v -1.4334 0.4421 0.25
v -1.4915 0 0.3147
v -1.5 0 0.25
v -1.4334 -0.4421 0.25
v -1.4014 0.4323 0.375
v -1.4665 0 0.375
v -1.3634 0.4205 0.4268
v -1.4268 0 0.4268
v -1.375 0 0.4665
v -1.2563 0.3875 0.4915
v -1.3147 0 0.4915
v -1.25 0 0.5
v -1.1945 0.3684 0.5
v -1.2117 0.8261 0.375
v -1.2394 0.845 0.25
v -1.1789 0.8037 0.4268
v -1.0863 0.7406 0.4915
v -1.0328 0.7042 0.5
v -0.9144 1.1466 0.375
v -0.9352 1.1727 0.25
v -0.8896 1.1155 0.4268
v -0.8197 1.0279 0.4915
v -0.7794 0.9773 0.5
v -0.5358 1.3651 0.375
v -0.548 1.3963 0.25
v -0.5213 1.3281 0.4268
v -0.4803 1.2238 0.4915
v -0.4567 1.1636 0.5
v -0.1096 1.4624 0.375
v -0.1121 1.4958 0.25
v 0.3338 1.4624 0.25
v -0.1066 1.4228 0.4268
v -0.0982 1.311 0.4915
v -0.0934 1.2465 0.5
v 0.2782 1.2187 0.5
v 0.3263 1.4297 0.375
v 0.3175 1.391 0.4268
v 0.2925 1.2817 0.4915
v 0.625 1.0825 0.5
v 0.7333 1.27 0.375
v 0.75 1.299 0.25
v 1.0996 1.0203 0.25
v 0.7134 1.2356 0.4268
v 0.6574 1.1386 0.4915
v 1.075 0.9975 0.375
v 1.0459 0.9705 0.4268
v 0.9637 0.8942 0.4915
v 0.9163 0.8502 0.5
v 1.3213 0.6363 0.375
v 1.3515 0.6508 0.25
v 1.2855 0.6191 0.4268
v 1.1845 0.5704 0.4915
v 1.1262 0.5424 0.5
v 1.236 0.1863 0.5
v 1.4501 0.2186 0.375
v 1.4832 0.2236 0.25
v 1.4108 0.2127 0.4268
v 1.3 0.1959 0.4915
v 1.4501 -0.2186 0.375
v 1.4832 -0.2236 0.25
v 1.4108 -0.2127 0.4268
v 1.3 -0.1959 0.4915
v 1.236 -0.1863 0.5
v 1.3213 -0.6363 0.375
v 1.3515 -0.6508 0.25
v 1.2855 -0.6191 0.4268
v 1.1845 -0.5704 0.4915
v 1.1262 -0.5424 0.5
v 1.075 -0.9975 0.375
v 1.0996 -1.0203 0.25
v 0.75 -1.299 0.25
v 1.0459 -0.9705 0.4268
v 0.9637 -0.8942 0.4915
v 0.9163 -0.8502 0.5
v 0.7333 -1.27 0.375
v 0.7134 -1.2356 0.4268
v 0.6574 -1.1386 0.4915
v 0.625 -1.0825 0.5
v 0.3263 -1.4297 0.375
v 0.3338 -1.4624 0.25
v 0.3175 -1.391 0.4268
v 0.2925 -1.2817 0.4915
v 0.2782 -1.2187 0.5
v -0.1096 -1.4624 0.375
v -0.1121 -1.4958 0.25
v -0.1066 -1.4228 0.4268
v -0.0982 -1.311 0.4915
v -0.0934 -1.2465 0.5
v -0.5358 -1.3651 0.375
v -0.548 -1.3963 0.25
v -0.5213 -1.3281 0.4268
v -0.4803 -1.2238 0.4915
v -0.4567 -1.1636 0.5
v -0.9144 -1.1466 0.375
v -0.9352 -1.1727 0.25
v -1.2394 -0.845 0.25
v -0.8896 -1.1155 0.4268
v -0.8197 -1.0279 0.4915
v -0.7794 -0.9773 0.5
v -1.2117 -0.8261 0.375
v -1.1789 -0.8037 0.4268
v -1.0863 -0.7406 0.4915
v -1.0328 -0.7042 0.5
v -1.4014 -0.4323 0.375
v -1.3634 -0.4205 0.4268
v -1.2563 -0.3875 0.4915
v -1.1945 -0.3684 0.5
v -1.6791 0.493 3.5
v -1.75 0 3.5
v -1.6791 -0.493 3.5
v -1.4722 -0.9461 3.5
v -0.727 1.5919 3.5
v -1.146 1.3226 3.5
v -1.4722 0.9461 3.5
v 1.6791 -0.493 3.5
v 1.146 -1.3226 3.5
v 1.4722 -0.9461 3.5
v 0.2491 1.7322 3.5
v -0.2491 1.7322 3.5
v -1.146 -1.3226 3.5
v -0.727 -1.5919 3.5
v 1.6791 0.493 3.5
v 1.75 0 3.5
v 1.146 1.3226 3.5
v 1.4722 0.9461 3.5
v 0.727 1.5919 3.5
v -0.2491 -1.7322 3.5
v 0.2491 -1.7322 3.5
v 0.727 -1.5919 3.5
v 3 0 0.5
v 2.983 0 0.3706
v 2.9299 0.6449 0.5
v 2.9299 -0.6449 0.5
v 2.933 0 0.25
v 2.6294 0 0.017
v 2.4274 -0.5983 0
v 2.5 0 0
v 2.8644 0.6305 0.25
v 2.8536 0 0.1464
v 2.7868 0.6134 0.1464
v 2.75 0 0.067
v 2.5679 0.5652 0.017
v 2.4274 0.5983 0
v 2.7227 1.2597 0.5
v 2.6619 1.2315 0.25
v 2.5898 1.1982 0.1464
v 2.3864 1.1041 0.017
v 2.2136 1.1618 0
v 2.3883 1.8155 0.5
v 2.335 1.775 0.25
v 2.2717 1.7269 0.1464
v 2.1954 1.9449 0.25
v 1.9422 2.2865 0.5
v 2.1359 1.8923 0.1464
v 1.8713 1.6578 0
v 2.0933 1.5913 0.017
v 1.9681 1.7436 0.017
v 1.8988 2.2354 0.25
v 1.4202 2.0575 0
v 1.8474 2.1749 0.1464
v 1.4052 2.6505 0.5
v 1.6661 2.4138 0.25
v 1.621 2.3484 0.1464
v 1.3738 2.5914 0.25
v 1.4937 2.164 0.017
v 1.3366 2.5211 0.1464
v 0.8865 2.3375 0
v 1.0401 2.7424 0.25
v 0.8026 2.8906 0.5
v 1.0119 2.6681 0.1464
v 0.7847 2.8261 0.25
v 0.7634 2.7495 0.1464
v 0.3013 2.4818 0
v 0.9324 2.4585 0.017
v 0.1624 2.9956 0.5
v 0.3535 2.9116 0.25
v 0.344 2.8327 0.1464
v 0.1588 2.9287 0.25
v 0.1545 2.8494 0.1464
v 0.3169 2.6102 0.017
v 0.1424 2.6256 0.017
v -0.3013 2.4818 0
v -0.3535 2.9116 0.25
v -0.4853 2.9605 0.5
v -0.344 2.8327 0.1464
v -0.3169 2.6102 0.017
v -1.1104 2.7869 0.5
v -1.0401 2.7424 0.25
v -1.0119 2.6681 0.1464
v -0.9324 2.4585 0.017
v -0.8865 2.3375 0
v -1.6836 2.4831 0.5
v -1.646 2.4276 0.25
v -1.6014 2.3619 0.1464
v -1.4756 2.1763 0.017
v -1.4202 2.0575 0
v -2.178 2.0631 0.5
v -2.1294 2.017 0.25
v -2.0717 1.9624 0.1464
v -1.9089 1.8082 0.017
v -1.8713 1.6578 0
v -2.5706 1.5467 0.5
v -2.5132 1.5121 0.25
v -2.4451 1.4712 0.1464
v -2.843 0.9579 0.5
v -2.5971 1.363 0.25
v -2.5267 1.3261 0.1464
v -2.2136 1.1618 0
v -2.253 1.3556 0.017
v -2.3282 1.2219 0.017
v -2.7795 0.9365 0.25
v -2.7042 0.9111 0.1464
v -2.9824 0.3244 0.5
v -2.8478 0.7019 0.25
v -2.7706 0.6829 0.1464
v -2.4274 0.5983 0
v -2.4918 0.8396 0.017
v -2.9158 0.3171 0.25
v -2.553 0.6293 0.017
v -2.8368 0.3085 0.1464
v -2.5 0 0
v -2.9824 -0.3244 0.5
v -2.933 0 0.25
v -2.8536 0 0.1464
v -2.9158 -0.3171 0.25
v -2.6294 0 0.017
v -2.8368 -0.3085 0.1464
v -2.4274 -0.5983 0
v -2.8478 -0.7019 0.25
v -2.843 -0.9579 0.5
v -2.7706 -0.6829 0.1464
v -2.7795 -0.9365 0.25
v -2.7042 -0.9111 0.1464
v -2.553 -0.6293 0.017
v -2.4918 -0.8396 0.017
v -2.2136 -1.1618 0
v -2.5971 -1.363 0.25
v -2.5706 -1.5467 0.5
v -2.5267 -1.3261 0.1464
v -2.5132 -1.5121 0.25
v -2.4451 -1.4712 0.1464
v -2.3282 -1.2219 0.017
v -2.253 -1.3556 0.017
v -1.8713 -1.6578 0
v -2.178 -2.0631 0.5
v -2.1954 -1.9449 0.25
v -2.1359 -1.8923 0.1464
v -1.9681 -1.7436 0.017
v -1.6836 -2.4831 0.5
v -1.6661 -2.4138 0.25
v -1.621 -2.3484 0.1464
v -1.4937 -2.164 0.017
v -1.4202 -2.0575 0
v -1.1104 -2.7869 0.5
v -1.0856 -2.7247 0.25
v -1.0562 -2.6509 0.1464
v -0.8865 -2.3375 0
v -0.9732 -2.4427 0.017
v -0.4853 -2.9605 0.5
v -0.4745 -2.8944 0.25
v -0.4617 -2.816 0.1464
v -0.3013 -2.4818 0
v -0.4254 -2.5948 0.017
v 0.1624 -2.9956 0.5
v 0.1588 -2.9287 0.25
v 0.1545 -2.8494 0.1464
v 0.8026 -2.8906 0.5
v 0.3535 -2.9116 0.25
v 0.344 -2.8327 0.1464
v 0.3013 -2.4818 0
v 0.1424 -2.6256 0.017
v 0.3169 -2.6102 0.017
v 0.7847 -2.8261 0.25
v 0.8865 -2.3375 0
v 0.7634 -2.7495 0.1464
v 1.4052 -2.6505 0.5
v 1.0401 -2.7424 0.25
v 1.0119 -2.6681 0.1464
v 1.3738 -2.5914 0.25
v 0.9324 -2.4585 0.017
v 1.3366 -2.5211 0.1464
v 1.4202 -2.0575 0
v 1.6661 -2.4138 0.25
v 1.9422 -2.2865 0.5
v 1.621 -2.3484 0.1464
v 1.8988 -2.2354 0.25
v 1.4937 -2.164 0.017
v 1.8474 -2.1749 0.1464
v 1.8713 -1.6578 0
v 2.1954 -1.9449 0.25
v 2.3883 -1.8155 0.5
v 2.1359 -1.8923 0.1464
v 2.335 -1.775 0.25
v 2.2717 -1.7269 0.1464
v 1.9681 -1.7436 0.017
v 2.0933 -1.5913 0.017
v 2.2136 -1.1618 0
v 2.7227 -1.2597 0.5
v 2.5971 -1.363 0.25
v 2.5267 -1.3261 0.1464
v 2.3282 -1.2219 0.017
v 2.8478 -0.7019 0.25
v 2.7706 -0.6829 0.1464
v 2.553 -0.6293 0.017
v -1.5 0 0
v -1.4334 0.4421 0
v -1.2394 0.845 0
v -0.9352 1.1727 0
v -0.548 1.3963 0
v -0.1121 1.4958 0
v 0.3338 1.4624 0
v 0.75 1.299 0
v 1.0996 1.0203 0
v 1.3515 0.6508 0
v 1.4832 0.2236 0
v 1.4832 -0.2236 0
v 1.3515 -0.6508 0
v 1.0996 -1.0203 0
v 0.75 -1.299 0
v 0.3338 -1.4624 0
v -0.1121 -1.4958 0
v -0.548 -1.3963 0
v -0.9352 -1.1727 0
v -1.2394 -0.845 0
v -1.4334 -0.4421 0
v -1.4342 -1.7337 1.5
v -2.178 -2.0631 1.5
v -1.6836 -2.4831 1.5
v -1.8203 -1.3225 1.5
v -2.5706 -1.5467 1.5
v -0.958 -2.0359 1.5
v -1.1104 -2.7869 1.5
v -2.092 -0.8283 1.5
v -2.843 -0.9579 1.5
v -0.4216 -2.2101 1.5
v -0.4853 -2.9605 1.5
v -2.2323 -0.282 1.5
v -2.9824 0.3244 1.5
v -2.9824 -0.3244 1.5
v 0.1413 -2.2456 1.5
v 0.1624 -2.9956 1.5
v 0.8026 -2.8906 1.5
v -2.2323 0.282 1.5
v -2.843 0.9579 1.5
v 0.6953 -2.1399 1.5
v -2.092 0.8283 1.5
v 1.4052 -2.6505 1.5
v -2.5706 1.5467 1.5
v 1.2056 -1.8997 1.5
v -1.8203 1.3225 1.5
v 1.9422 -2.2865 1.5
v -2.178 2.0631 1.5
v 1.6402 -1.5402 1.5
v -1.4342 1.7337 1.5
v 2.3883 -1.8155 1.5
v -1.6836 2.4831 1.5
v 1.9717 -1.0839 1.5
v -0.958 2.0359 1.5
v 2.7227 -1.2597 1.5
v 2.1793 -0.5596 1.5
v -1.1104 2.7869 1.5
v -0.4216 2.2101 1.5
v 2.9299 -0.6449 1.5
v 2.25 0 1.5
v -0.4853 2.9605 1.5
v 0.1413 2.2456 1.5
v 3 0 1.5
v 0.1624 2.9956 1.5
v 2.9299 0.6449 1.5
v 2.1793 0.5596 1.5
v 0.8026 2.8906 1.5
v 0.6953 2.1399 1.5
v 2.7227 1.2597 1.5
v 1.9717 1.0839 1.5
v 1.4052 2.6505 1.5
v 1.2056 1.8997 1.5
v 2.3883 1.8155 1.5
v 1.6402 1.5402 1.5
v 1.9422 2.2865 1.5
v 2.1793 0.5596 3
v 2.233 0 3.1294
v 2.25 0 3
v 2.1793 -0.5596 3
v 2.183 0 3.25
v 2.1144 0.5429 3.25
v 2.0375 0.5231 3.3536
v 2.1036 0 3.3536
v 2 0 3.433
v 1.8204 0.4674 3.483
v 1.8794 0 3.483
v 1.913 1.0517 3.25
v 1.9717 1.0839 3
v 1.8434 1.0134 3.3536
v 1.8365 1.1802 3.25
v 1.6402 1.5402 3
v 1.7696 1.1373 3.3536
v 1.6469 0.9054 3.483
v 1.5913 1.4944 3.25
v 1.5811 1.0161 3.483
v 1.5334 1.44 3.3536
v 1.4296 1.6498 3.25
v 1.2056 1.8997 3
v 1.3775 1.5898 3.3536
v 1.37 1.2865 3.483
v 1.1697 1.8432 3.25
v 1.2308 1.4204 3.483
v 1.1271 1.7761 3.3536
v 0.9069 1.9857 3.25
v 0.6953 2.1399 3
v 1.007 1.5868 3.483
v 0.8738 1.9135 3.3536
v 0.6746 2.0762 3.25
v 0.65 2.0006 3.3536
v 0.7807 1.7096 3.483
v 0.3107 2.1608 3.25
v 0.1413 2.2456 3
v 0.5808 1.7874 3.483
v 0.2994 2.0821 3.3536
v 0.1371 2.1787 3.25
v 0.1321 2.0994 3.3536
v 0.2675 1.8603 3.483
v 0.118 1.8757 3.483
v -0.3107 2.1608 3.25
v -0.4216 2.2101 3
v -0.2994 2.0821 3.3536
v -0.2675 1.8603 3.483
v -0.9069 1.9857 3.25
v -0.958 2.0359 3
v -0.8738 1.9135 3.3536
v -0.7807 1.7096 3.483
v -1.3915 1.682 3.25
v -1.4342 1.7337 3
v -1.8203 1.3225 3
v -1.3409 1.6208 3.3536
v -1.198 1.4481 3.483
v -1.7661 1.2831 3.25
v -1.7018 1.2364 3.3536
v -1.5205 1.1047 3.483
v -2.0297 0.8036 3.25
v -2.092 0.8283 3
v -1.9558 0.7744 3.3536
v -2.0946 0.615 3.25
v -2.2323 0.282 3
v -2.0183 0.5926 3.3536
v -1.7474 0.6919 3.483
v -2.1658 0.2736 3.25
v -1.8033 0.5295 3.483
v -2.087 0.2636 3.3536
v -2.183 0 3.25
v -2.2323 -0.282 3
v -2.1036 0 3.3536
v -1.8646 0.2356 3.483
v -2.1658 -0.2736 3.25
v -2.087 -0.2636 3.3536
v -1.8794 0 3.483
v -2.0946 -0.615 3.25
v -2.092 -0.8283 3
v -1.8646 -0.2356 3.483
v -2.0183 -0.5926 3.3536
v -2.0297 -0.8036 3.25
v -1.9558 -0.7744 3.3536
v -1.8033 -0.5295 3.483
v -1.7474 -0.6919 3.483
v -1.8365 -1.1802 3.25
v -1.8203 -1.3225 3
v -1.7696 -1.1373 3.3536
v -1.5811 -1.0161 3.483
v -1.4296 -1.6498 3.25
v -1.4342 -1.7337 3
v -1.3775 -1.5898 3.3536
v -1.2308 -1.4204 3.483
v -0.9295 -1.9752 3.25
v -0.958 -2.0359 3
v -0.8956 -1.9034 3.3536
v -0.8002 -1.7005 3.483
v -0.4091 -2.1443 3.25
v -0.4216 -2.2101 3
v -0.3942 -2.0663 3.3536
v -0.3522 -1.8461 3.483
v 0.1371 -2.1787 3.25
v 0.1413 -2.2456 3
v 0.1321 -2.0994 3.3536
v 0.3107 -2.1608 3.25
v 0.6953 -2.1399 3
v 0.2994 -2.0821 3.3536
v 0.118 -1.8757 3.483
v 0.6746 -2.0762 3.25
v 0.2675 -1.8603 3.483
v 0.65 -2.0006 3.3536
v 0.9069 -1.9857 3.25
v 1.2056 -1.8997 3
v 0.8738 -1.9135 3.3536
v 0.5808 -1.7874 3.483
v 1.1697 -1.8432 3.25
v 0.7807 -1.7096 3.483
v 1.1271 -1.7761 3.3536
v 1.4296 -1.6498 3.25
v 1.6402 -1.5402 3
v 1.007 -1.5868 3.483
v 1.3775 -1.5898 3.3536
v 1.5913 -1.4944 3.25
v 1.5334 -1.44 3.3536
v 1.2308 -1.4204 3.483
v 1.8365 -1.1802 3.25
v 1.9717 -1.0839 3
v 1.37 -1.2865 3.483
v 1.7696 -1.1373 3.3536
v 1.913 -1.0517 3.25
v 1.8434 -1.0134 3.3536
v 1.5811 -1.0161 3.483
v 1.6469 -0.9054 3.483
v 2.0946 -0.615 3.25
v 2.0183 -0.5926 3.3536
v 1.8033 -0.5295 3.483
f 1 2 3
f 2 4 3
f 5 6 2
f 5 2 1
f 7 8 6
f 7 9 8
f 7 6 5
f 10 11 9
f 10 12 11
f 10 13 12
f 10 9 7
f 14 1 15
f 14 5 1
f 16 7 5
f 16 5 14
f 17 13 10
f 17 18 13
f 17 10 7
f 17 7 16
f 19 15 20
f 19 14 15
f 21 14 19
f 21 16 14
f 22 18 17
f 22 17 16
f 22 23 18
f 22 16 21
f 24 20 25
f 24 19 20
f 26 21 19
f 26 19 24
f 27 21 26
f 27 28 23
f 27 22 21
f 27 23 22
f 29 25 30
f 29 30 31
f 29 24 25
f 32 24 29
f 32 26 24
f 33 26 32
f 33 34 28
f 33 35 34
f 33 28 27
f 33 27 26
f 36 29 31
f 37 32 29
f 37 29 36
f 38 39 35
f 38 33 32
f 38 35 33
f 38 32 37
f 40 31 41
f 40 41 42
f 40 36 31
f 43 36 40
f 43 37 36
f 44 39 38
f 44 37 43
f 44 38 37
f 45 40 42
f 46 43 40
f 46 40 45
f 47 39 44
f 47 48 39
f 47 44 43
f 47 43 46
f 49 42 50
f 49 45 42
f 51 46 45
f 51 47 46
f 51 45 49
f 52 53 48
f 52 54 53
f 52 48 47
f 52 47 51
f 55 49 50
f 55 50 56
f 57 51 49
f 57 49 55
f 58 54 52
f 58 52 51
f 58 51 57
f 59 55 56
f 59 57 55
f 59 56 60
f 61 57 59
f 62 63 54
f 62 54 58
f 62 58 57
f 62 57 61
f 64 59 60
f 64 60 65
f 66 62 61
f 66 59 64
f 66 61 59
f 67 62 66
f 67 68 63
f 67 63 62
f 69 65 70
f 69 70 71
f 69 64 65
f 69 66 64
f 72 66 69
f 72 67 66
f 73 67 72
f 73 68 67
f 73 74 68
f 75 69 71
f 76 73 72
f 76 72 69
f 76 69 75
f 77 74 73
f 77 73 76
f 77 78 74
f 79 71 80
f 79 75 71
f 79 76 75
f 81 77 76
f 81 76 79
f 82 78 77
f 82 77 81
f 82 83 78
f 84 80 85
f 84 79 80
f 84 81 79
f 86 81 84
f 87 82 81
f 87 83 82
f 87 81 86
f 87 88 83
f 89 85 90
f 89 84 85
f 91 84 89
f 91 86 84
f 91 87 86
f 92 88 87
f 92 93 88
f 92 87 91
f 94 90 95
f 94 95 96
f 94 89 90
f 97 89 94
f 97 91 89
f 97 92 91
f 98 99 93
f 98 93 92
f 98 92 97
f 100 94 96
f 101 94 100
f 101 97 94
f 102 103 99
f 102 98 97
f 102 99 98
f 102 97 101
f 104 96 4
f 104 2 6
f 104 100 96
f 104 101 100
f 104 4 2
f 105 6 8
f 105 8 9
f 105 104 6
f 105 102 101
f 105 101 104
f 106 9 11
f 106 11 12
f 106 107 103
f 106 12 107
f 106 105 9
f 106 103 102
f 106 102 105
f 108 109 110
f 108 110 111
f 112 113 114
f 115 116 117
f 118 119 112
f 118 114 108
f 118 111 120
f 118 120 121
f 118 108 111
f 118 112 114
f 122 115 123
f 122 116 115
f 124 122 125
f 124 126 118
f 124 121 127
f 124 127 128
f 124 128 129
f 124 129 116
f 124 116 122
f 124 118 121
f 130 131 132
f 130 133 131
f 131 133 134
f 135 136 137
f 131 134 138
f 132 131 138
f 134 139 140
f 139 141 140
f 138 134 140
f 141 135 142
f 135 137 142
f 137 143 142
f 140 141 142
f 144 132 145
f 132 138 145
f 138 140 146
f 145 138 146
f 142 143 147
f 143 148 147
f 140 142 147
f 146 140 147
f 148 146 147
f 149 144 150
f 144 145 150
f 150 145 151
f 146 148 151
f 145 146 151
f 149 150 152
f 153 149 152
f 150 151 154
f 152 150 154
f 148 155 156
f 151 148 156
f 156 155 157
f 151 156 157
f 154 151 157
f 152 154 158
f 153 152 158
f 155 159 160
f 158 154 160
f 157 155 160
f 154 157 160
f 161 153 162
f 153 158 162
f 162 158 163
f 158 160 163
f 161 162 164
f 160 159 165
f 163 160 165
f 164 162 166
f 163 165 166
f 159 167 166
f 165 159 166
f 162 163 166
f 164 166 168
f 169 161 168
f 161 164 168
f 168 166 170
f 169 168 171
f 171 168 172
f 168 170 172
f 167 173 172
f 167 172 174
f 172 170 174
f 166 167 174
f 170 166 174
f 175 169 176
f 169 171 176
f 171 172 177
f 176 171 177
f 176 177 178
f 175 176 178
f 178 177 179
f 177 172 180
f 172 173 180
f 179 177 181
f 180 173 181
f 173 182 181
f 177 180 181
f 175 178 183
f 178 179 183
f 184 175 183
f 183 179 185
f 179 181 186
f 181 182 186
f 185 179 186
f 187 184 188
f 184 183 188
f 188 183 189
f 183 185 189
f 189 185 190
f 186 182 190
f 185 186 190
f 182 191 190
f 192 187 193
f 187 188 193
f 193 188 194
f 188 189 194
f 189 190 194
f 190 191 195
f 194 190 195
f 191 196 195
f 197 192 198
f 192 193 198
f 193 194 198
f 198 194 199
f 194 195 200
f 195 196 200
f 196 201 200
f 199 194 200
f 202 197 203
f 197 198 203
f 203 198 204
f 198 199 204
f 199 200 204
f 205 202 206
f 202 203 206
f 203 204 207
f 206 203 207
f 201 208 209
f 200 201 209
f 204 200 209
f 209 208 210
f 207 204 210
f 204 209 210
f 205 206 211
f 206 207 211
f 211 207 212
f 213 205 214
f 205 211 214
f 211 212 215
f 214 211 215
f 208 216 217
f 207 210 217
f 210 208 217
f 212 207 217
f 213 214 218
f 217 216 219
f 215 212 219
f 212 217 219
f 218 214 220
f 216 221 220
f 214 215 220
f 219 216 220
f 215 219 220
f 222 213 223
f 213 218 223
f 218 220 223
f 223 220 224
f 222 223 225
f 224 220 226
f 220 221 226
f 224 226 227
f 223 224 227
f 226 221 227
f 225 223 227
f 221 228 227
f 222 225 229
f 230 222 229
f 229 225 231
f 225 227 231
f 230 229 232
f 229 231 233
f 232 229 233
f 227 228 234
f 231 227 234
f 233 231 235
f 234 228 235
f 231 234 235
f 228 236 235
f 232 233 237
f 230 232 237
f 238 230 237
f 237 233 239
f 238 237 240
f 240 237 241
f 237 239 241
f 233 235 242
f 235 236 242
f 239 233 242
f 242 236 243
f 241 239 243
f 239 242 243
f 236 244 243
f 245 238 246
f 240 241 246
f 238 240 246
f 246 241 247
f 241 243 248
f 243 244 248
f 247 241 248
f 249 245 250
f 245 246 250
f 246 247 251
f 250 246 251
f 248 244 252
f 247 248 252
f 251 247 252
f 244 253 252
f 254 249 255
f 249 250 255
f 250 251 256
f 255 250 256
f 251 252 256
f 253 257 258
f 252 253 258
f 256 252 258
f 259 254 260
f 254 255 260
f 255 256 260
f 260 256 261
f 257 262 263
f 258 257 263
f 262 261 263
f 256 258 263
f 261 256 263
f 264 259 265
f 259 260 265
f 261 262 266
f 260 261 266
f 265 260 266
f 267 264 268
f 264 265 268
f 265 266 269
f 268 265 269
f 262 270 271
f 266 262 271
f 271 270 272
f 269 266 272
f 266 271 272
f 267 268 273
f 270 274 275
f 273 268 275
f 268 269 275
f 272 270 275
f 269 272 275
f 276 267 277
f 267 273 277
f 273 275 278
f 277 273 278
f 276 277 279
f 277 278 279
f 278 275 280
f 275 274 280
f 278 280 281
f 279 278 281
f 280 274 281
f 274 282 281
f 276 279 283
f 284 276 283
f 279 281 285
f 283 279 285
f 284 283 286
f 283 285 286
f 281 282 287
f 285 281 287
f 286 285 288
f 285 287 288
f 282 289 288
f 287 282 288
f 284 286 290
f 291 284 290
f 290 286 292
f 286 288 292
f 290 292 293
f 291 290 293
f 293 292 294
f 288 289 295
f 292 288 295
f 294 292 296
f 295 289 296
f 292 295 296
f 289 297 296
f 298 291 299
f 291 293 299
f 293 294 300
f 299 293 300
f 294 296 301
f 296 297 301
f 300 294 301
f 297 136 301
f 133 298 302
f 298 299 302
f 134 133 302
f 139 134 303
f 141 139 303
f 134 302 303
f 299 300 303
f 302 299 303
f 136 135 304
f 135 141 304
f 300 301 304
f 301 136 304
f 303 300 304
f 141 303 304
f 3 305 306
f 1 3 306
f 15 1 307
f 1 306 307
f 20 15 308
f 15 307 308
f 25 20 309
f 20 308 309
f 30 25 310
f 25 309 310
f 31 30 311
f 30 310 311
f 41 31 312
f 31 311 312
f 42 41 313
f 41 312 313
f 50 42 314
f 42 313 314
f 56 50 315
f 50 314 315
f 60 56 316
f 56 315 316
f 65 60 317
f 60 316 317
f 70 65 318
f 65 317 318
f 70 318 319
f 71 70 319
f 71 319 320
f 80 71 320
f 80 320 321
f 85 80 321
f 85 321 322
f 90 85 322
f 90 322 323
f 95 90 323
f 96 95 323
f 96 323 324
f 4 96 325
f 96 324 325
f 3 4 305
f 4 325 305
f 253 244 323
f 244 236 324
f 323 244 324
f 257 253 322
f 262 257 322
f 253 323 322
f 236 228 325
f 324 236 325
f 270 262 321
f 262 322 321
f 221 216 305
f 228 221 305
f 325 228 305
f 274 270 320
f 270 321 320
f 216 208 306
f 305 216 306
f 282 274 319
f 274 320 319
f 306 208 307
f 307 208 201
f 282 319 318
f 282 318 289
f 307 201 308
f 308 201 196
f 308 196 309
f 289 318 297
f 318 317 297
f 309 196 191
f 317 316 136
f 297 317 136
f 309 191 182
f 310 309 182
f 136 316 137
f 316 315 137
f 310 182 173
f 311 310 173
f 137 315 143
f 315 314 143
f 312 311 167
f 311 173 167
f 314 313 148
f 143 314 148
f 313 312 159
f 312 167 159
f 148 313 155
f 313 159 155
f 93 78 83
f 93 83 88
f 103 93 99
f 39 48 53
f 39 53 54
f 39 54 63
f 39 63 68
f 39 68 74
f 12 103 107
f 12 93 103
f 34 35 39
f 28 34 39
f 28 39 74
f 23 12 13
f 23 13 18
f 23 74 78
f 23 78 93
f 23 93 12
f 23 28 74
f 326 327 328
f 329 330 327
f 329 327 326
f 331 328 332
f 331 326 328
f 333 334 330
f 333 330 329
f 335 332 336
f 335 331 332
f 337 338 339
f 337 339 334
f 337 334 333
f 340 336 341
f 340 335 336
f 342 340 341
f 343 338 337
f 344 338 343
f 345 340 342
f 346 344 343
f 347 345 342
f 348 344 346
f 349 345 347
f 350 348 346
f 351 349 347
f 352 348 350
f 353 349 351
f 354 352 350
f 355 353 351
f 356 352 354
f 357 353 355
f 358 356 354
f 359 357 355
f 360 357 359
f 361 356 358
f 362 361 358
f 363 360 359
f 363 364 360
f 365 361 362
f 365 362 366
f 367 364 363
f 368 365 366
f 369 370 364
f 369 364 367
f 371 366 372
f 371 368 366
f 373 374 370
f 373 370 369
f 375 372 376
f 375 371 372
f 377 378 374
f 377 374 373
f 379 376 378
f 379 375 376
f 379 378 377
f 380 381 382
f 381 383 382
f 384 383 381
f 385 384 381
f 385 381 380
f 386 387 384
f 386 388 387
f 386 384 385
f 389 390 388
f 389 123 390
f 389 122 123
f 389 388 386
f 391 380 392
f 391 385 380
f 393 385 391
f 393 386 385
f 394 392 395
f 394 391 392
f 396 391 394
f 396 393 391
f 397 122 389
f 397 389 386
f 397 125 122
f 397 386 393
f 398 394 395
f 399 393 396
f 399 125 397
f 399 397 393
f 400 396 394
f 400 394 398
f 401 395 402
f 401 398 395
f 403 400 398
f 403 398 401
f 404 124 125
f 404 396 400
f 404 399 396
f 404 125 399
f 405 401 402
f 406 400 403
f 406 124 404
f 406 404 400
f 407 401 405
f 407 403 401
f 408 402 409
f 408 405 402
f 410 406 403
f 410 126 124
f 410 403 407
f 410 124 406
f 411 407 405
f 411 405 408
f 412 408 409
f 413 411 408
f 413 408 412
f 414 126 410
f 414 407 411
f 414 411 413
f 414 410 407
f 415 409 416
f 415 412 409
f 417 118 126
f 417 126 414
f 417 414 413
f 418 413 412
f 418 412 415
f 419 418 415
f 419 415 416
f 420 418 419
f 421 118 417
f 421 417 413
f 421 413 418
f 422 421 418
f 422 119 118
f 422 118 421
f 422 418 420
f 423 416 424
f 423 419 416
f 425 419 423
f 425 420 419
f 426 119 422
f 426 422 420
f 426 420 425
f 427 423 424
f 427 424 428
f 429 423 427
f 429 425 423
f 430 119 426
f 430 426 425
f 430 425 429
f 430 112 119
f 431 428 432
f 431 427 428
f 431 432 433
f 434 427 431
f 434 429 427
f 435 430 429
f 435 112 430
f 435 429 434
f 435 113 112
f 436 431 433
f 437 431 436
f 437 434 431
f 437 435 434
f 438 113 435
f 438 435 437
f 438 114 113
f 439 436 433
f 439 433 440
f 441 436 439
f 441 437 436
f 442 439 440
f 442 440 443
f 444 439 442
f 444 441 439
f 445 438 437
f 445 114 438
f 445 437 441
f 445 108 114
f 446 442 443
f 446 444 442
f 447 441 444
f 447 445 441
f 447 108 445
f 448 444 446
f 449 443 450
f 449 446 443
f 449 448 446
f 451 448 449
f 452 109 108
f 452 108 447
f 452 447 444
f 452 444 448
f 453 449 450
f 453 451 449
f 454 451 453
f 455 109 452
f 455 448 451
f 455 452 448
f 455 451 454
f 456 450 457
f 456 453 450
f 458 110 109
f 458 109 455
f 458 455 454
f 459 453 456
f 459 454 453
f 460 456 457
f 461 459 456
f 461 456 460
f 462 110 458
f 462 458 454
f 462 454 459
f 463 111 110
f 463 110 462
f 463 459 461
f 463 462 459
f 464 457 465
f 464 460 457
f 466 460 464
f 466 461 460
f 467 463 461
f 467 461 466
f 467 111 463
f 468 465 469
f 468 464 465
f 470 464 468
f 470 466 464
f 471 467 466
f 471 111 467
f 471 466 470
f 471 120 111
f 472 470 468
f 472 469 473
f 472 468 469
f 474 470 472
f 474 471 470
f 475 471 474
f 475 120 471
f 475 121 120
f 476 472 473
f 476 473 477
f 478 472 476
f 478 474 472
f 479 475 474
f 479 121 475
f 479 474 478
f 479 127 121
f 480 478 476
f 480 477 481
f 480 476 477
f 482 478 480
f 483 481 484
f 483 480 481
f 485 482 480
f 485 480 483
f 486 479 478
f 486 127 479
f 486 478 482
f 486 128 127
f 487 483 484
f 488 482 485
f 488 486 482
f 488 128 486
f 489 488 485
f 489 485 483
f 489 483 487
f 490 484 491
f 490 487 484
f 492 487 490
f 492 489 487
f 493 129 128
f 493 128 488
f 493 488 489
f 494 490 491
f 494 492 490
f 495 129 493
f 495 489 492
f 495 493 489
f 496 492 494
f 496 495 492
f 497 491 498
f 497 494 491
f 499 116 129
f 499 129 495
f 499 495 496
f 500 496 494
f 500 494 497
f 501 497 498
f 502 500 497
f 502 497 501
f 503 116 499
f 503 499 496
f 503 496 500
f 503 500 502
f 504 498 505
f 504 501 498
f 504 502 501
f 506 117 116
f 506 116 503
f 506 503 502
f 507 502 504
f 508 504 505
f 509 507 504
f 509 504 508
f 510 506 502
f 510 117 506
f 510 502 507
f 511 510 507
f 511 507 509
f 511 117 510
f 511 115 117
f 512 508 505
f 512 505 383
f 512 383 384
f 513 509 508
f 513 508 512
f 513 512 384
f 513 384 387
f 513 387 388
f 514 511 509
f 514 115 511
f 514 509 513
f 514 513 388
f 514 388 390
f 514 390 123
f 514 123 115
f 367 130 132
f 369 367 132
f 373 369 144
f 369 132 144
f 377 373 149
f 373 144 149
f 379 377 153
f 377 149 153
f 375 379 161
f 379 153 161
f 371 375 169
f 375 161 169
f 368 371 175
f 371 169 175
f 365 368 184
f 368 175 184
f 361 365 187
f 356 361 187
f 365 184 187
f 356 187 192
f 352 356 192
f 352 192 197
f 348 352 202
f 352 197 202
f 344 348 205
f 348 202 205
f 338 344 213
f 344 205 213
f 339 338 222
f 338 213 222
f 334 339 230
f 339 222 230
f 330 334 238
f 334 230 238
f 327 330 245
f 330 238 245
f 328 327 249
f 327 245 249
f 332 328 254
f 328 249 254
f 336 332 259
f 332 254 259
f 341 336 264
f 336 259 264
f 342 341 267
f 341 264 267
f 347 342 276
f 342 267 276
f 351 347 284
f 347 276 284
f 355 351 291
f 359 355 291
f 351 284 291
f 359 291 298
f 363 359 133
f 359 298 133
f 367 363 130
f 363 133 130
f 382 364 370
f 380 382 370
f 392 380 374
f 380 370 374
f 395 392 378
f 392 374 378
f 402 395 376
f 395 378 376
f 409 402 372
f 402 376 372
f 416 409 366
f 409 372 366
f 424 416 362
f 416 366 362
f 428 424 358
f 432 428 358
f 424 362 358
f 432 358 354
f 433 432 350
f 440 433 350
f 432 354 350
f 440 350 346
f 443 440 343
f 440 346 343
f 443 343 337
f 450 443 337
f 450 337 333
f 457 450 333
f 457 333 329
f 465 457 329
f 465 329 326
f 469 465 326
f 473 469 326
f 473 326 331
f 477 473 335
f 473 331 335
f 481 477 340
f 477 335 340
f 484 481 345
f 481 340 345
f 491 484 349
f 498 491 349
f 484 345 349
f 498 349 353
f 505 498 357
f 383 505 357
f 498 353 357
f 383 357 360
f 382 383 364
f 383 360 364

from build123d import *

# Parameters (mm, degrees)
SKETCH_1_R          = 3
EXTRUDE_1_DEPTH     = 1.5
SKETCH_2_R          = 2.25
EXTRUDE_2_DEPTH     = 2
SKETCH_3_R          = 1.5
CUT_EXTRUDE_1_DEPTH = 0.5
FILLET_1_R          = 0.25
FILLET_2_R          = 0.5
FILLET_3_R          = 0.5


with BuildPart() as part:
    # Эскиз1 → Бобышка-Вытянуть1 (new body)
    with BuildSketch(Plane.XY):
        Circle(SKETCH_1_R)
    extrude(amount=EXTRUDE_1_DEPTH)

    # Эскиз2 → Бобышка-Вытянуть2 (add)
    with BuildSketch(Plane.XY.offset(1.5)):
        Circle(SKETCH_2_R)
    extrude(amount=EXTRUDE_2_DEPTH)

    # Эскиз3 → Вырез-Вытянуть1 (cut)
    with BuildSketch(Plane(origin=(0, 0, 0), x_dir=(-1, 0, 0), z_dir=(0, 0, -1))):
        Circle(SKETCH_3_R)
    extrude(amount=-CUT_EXTRUDE_1_DEPTH, mode=Mode.SUBTRACT)

    # Скругление1
    fillet_1_edges = [part.edges().sort_by_distance(p)[0] for p in [
        (1.5, 0, 0.5),
    ]]
    fillet(fillet_1_edges, radius=FILLET_1_R)

    # Скругление2
    fillet_2_edges = [part.edges().sort_by_distance(p)[0] for p in [
        (-2.25, 0, 3.5),
    ]]
    fillet(fillet_2_edges, radius=FILLET_2_R)

    # Скругление3
    fillet_3_edges = [part.edges().sort_by_distance(p)[0] for p in [
        (-3, 0, 0),
    ]]
    fillet(fillet_3_edges, radius=FILLET_3_R)


solid = part.part
